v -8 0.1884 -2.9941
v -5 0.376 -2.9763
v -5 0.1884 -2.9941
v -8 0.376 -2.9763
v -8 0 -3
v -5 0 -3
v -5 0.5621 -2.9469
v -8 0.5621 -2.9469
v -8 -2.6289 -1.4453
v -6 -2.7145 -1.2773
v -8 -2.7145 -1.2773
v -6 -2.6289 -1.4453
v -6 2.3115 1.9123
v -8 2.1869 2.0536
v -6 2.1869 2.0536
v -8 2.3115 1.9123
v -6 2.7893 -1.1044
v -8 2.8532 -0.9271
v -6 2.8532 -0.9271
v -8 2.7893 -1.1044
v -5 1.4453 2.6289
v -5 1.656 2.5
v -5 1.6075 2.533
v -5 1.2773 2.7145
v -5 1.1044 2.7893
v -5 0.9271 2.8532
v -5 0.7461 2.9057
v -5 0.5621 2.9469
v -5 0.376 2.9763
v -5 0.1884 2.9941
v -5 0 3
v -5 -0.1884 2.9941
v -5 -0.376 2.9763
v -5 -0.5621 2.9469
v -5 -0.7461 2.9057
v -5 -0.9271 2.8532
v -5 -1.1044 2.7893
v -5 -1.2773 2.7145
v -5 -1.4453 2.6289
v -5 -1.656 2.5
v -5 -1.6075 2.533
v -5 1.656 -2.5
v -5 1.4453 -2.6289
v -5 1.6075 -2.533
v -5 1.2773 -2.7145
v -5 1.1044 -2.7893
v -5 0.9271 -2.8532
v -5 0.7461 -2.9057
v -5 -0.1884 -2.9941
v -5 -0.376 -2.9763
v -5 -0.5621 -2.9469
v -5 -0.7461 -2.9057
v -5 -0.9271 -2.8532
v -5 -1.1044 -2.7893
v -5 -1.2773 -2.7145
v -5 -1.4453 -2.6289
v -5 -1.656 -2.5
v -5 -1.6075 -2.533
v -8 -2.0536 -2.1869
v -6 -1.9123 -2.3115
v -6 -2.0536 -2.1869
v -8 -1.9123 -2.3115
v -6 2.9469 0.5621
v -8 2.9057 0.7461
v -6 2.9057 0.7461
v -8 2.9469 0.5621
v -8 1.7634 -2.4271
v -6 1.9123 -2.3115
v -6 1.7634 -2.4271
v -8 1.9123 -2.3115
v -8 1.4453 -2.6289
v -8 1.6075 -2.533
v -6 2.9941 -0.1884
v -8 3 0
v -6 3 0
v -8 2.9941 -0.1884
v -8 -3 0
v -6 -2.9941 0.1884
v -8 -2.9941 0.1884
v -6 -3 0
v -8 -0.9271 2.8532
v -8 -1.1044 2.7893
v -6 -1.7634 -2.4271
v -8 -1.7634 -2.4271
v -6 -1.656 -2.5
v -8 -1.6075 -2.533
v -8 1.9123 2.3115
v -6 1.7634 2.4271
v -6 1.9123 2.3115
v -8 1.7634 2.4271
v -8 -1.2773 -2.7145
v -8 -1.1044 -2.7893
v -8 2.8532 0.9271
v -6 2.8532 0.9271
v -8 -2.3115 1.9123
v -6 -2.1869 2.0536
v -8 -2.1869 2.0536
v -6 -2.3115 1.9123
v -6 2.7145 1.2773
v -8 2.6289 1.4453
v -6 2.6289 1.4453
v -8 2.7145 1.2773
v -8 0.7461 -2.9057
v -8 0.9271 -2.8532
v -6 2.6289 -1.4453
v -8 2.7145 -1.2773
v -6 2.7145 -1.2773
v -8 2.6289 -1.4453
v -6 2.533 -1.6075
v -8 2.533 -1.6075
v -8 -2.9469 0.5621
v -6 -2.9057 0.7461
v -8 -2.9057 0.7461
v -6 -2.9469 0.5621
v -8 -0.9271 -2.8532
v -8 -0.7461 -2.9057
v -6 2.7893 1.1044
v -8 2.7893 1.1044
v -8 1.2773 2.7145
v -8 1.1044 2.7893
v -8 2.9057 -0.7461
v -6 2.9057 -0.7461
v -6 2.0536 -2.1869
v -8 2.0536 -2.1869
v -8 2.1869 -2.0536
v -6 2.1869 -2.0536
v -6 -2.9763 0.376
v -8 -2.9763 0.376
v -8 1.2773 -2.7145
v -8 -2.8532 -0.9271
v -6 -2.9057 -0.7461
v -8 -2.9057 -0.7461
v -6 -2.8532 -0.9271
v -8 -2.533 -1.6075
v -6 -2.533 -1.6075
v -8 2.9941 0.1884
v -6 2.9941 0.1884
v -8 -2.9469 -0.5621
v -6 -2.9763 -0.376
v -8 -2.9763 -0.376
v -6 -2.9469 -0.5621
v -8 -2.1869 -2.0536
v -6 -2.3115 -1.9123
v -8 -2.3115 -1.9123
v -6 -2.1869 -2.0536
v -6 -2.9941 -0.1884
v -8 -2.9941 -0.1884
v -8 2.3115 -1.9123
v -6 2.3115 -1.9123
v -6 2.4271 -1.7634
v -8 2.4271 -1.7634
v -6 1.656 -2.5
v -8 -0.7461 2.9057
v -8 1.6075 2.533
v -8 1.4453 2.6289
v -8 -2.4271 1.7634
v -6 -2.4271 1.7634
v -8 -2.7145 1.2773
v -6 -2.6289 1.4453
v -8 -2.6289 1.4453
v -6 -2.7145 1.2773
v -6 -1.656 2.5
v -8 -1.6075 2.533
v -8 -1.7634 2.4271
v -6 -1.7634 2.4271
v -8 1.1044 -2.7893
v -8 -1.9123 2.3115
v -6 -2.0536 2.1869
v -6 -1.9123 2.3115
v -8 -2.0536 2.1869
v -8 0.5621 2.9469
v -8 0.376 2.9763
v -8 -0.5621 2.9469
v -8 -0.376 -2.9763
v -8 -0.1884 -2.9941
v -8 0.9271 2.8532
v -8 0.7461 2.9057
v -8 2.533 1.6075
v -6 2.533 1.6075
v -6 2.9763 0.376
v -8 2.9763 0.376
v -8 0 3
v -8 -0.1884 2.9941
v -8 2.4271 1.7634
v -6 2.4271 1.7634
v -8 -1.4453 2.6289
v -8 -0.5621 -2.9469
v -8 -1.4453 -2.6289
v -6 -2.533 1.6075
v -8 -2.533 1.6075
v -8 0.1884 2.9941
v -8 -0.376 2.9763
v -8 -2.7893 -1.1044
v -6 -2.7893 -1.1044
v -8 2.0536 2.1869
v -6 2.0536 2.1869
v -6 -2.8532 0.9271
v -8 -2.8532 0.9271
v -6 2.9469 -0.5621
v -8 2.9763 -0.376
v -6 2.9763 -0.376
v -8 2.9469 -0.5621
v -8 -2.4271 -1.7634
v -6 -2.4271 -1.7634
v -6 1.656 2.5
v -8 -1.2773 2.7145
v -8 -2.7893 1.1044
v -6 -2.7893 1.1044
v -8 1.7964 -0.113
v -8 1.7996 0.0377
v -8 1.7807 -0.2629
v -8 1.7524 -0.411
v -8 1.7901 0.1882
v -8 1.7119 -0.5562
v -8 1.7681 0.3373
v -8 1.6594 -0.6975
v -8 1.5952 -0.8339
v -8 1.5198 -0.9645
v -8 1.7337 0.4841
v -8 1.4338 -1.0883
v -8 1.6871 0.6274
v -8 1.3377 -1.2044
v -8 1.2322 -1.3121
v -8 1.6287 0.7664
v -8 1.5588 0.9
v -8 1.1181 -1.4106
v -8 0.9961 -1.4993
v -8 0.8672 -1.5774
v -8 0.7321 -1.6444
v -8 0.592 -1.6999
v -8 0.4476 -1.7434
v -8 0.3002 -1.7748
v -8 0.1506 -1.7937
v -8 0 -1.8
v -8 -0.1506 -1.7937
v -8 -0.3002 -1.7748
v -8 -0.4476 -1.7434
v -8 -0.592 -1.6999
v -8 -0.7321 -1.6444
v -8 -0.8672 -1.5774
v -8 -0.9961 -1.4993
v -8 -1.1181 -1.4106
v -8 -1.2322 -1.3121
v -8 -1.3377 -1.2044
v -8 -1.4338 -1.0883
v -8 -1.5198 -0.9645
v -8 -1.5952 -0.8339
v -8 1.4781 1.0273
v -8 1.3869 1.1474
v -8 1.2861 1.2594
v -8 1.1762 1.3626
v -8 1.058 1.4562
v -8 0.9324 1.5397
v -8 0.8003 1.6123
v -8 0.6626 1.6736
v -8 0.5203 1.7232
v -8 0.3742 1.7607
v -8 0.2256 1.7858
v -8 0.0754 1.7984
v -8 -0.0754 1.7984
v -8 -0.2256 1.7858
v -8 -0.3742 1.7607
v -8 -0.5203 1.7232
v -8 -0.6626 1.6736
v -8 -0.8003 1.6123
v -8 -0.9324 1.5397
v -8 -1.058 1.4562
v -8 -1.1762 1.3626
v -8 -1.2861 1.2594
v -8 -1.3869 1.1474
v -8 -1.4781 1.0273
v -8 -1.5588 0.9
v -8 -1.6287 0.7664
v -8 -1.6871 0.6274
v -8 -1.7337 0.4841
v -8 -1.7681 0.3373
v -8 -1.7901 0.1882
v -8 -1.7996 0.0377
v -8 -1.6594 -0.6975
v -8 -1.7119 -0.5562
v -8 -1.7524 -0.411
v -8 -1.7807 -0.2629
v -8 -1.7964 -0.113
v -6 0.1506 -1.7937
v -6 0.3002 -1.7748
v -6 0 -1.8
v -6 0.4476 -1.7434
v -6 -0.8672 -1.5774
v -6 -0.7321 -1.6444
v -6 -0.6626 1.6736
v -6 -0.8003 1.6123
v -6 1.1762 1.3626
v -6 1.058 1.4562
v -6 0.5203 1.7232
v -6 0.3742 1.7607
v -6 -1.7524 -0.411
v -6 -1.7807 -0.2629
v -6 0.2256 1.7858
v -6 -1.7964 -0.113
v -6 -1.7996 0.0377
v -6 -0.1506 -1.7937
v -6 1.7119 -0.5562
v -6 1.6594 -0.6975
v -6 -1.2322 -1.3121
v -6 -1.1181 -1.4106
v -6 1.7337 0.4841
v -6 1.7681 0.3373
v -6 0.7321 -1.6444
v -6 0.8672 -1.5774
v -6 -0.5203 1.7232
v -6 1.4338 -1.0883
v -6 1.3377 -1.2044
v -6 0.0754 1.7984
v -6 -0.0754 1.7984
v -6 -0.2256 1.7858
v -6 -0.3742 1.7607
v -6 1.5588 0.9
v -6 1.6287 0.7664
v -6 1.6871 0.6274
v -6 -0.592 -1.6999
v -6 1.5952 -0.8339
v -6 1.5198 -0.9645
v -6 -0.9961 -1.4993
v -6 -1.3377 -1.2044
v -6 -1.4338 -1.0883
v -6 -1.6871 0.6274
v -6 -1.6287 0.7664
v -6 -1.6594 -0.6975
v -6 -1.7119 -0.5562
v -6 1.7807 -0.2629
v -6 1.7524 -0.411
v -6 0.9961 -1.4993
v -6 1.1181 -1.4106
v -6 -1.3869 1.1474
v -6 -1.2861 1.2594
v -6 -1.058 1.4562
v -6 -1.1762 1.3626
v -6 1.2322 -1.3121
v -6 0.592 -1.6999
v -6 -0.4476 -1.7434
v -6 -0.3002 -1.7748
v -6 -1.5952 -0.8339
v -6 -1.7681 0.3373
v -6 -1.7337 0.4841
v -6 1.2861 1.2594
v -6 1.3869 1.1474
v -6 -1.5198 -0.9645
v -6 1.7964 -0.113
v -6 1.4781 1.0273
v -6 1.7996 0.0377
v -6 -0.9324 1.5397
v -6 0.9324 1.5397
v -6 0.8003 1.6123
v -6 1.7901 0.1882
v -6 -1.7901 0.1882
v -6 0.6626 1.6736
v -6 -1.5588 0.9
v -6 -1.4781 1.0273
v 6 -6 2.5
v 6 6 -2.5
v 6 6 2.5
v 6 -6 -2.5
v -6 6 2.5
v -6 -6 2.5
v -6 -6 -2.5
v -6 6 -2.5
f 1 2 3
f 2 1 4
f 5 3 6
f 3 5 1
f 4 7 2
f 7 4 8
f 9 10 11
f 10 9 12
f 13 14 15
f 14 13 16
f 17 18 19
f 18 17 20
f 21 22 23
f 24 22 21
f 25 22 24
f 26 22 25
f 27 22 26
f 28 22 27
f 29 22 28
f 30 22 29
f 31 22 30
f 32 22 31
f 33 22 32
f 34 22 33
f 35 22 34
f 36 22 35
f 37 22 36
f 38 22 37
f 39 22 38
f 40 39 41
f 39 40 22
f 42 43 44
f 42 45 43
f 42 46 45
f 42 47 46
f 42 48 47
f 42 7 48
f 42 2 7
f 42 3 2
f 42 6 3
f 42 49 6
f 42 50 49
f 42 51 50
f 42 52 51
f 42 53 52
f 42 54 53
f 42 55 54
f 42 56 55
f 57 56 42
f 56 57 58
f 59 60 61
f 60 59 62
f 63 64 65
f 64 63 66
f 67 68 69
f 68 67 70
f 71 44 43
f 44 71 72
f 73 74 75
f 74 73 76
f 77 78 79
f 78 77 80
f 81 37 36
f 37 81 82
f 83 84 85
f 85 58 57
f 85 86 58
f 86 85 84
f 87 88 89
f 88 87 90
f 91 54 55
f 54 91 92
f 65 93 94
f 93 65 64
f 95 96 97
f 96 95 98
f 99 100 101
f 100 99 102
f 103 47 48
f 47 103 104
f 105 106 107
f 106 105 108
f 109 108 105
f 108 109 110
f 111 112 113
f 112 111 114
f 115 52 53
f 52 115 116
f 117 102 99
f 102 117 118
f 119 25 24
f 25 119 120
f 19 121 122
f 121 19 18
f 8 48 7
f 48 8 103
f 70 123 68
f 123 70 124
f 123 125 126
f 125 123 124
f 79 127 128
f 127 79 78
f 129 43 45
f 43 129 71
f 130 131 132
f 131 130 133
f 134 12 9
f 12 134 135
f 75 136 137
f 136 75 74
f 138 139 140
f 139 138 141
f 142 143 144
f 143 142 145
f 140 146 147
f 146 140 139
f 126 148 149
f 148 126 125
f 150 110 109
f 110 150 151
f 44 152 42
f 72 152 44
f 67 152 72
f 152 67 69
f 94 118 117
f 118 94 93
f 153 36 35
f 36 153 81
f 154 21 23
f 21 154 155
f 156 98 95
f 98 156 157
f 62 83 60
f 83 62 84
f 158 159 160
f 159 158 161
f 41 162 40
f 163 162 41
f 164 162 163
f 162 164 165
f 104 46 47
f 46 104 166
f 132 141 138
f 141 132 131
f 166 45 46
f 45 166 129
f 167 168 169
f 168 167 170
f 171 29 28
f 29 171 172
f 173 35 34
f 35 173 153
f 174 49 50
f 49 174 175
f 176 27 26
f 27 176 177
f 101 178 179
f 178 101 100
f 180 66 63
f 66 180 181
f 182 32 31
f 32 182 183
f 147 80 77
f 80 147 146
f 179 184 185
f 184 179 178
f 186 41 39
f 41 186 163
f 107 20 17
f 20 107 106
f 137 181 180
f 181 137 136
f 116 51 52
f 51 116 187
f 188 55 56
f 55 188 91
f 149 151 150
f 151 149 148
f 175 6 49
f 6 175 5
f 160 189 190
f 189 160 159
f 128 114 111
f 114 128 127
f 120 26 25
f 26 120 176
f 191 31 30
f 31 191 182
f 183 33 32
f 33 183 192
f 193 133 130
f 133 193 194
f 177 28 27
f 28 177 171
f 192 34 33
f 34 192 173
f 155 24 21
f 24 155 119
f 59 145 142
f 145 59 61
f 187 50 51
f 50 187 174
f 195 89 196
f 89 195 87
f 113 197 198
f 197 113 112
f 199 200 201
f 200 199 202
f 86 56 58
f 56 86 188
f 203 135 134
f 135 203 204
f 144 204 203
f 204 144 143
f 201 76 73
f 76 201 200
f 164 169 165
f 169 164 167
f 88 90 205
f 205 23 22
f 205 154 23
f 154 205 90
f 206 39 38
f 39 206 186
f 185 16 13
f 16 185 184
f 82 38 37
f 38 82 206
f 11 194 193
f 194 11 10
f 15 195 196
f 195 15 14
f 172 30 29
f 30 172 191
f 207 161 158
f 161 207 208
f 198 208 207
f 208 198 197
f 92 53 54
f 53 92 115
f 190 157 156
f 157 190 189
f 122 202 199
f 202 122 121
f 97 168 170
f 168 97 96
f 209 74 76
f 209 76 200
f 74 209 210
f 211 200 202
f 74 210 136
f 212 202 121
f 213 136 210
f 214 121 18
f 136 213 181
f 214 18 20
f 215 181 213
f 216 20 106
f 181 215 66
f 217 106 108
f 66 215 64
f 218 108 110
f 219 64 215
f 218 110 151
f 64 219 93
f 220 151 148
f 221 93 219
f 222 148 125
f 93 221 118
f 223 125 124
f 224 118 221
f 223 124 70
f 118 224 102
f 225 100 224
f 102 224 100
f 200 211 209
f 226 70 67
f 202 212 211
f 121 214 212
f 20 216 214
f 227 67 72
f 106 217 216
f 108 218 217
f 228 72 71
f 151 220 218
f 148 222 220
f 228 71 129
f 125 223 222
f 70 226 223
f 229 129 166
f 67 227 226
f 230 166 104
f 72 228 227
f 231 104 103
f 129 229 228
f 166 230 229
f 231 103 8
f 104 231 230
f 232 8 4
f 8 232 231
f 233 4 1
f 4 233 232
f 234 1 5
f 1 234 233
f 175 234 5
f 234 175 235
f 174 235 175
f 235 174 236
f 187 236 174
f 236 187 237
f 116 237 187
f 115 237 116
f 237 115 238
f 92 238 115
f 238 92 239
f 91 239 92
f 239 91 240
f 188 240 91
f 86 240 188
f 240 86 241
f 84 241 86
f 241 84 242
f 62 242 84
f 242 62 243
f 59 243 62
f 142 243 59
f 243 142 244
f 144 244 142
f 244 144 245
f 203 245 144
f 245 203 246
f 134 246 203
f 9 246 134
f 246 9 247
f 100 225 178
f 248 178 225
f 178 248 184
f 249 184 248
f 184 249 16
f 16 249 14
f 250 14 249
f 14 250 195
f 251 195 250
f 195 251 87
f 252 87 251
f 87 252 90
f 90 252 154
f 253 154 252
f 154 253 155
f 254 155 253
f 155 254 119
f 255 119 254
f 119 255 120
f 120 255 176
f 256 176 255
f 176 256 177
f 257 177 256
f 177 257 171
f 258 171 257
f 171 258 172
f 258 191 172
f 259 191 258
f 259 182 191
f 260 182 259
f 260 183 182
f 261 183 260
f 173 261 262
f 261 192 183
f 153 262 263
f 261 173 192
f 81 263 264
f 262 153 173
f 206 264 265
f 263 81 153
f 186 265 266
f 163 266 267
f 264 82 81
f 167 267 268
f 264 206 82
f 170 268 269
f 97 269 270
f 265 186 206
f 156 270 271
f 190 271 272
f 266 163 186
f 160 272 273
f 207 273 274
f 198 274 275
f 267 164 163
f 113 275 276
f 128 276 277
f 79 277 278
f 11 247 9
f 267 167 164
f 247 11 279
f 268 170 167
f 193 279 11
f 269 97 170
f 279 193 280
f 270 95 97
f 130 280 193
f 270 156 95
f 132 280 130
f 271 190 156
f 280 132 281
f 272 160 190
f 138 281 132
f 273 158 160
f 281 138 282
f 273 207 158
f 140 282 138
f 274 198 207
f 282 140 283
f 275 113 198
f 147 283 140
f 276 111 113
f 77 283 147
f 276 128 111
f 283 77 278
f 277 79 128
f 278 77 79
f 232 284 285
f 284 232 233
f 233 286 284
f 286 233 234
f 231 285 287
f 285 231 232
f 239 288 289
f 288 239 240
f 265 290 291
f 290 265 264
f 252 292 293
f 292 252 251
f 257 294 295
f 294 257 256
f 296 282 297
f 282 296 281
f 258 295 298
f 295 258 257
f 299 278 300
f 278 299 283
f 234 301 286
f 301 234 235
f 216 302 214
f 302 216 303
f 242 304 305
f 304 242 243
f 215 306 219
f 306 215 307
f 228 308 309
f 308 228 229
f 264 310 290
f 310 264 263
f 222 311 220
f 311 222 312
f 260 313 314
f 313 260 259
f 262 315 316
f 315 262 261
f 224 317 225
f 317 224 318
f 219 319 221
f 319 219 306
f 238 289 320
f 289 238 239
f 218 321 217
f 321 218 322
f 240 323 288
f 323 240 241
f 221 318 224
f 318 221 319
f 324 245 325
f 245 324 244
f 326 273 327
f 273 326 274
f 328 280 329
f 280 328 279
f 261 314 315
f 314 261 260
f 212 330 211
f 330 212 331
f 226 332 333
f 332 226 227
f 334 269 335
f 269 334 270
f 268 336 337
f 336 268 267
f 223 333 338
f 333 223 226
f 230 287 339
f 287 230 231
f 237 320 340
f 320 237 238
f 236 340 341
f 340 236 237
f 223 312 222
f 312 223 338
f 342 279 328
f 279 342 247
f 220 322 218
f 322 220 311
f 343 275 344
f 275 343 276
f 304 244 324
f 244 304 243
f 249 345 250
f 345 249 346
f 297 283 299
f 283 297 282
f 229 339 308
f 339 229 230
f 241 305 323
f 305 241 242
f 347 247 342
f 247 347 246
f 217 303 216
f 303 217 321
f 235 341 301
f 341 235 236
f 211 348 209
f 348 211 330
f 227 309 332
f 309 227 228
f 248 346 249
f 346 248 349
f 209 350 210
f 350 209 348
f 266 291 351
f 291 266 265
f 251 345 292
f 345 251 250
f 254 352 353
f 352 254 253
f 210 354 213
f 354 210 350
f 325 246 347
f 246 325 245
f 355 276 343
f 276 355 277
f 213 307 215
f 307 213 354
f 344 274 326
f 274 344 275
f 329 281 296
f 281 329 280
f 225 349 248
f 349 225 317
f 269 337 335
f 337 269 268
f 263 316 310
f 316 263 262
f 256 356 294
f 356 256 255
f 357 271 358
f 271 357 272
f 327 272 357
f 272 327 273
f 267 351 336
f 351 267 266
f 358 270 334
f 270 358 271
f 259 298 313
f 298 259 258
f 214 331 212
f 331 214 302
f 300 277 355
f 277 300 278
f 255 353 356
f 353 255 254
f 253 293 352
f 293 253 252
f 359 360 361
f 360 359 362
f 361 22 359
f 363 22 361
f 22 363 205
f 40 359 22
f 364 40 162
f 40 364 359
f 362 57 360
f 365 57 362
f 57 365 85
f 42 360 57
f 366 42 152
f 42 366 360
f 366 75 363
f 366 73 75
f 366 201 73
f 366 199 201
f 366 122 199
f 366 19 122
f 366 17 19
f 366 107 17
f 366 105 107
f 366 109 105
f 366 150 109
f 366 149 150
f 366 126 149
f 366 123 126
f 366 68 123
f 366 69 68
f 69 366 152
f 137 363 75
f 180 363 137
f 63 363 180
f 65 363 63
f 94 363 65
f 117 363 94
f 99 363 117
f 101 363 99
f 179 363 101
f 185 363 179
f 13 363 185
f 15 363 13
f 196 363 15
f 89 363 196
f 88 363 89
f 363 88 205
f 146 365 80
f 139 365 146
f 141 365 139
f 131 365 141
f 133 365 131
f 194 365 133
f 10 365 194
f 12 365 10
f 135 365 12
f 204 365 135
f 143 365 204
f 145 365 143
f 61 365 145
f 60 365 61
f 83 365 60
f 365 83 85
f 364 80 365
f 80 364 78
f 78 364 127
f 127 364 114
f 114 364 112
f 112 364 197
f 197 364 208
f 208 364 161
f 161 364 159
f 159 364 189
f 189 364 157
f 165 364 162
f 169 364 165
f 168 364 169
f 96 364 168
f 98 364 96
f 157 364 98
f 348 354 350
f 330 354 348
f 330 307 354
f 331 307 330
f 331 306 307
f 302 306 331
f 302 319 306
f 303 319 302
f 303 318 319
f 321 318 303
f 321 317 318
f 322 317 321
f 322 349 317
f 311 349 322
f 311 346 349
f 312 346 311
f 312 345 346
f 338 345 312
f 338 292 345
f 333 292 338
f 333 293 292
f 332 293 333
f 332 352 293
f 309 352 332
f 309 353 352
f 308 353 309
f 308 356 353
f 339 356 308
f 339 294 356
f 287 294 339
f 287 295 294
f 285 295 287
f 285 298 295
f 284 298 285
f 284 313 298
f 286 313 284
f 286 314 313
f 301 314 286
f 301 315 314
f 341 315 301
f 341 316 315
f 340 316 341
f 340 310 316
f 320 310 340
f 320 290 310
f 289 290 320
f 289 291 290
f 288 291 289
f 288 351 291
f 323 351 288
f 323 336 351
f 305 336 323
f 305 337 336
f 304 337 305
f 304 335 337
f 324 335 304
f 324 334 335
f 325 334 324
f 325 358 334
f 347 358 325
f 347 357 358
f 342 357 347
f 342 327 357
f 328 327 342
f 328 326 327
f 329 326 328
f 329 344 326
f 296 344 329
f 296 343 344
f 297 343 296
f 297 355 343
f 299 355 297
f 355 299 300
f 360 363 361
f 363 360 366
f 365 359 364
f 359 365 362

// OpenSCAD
module audiojack()
{
    BOX_WIDTH=12;
    BOX_HEIGTH=5;

    JACK_OUTER_D=6;
    JACK_INNER_D=3.6;
    JACK_HEIGHT=3;

    union() {
        color("black") cube([BOX_WIDTH,BOX_WIDTH,BOX_HEIGTH], center=true);
        
        translate([-(JACK_HEIGHT+BOX_WIDTH)/2+1,0,0]) rotate([0,90,0]) color("grey")
        difference() {
            cylinder(h=JACK_HEIGHT,d=JACK_OUTER_D,center=true, $fn=100);
            cylinder(h=JACK_HEIGHT+1,d=JACK_INNER_D,center=true, $fn=75);
        }
    }
}

audiojack();
